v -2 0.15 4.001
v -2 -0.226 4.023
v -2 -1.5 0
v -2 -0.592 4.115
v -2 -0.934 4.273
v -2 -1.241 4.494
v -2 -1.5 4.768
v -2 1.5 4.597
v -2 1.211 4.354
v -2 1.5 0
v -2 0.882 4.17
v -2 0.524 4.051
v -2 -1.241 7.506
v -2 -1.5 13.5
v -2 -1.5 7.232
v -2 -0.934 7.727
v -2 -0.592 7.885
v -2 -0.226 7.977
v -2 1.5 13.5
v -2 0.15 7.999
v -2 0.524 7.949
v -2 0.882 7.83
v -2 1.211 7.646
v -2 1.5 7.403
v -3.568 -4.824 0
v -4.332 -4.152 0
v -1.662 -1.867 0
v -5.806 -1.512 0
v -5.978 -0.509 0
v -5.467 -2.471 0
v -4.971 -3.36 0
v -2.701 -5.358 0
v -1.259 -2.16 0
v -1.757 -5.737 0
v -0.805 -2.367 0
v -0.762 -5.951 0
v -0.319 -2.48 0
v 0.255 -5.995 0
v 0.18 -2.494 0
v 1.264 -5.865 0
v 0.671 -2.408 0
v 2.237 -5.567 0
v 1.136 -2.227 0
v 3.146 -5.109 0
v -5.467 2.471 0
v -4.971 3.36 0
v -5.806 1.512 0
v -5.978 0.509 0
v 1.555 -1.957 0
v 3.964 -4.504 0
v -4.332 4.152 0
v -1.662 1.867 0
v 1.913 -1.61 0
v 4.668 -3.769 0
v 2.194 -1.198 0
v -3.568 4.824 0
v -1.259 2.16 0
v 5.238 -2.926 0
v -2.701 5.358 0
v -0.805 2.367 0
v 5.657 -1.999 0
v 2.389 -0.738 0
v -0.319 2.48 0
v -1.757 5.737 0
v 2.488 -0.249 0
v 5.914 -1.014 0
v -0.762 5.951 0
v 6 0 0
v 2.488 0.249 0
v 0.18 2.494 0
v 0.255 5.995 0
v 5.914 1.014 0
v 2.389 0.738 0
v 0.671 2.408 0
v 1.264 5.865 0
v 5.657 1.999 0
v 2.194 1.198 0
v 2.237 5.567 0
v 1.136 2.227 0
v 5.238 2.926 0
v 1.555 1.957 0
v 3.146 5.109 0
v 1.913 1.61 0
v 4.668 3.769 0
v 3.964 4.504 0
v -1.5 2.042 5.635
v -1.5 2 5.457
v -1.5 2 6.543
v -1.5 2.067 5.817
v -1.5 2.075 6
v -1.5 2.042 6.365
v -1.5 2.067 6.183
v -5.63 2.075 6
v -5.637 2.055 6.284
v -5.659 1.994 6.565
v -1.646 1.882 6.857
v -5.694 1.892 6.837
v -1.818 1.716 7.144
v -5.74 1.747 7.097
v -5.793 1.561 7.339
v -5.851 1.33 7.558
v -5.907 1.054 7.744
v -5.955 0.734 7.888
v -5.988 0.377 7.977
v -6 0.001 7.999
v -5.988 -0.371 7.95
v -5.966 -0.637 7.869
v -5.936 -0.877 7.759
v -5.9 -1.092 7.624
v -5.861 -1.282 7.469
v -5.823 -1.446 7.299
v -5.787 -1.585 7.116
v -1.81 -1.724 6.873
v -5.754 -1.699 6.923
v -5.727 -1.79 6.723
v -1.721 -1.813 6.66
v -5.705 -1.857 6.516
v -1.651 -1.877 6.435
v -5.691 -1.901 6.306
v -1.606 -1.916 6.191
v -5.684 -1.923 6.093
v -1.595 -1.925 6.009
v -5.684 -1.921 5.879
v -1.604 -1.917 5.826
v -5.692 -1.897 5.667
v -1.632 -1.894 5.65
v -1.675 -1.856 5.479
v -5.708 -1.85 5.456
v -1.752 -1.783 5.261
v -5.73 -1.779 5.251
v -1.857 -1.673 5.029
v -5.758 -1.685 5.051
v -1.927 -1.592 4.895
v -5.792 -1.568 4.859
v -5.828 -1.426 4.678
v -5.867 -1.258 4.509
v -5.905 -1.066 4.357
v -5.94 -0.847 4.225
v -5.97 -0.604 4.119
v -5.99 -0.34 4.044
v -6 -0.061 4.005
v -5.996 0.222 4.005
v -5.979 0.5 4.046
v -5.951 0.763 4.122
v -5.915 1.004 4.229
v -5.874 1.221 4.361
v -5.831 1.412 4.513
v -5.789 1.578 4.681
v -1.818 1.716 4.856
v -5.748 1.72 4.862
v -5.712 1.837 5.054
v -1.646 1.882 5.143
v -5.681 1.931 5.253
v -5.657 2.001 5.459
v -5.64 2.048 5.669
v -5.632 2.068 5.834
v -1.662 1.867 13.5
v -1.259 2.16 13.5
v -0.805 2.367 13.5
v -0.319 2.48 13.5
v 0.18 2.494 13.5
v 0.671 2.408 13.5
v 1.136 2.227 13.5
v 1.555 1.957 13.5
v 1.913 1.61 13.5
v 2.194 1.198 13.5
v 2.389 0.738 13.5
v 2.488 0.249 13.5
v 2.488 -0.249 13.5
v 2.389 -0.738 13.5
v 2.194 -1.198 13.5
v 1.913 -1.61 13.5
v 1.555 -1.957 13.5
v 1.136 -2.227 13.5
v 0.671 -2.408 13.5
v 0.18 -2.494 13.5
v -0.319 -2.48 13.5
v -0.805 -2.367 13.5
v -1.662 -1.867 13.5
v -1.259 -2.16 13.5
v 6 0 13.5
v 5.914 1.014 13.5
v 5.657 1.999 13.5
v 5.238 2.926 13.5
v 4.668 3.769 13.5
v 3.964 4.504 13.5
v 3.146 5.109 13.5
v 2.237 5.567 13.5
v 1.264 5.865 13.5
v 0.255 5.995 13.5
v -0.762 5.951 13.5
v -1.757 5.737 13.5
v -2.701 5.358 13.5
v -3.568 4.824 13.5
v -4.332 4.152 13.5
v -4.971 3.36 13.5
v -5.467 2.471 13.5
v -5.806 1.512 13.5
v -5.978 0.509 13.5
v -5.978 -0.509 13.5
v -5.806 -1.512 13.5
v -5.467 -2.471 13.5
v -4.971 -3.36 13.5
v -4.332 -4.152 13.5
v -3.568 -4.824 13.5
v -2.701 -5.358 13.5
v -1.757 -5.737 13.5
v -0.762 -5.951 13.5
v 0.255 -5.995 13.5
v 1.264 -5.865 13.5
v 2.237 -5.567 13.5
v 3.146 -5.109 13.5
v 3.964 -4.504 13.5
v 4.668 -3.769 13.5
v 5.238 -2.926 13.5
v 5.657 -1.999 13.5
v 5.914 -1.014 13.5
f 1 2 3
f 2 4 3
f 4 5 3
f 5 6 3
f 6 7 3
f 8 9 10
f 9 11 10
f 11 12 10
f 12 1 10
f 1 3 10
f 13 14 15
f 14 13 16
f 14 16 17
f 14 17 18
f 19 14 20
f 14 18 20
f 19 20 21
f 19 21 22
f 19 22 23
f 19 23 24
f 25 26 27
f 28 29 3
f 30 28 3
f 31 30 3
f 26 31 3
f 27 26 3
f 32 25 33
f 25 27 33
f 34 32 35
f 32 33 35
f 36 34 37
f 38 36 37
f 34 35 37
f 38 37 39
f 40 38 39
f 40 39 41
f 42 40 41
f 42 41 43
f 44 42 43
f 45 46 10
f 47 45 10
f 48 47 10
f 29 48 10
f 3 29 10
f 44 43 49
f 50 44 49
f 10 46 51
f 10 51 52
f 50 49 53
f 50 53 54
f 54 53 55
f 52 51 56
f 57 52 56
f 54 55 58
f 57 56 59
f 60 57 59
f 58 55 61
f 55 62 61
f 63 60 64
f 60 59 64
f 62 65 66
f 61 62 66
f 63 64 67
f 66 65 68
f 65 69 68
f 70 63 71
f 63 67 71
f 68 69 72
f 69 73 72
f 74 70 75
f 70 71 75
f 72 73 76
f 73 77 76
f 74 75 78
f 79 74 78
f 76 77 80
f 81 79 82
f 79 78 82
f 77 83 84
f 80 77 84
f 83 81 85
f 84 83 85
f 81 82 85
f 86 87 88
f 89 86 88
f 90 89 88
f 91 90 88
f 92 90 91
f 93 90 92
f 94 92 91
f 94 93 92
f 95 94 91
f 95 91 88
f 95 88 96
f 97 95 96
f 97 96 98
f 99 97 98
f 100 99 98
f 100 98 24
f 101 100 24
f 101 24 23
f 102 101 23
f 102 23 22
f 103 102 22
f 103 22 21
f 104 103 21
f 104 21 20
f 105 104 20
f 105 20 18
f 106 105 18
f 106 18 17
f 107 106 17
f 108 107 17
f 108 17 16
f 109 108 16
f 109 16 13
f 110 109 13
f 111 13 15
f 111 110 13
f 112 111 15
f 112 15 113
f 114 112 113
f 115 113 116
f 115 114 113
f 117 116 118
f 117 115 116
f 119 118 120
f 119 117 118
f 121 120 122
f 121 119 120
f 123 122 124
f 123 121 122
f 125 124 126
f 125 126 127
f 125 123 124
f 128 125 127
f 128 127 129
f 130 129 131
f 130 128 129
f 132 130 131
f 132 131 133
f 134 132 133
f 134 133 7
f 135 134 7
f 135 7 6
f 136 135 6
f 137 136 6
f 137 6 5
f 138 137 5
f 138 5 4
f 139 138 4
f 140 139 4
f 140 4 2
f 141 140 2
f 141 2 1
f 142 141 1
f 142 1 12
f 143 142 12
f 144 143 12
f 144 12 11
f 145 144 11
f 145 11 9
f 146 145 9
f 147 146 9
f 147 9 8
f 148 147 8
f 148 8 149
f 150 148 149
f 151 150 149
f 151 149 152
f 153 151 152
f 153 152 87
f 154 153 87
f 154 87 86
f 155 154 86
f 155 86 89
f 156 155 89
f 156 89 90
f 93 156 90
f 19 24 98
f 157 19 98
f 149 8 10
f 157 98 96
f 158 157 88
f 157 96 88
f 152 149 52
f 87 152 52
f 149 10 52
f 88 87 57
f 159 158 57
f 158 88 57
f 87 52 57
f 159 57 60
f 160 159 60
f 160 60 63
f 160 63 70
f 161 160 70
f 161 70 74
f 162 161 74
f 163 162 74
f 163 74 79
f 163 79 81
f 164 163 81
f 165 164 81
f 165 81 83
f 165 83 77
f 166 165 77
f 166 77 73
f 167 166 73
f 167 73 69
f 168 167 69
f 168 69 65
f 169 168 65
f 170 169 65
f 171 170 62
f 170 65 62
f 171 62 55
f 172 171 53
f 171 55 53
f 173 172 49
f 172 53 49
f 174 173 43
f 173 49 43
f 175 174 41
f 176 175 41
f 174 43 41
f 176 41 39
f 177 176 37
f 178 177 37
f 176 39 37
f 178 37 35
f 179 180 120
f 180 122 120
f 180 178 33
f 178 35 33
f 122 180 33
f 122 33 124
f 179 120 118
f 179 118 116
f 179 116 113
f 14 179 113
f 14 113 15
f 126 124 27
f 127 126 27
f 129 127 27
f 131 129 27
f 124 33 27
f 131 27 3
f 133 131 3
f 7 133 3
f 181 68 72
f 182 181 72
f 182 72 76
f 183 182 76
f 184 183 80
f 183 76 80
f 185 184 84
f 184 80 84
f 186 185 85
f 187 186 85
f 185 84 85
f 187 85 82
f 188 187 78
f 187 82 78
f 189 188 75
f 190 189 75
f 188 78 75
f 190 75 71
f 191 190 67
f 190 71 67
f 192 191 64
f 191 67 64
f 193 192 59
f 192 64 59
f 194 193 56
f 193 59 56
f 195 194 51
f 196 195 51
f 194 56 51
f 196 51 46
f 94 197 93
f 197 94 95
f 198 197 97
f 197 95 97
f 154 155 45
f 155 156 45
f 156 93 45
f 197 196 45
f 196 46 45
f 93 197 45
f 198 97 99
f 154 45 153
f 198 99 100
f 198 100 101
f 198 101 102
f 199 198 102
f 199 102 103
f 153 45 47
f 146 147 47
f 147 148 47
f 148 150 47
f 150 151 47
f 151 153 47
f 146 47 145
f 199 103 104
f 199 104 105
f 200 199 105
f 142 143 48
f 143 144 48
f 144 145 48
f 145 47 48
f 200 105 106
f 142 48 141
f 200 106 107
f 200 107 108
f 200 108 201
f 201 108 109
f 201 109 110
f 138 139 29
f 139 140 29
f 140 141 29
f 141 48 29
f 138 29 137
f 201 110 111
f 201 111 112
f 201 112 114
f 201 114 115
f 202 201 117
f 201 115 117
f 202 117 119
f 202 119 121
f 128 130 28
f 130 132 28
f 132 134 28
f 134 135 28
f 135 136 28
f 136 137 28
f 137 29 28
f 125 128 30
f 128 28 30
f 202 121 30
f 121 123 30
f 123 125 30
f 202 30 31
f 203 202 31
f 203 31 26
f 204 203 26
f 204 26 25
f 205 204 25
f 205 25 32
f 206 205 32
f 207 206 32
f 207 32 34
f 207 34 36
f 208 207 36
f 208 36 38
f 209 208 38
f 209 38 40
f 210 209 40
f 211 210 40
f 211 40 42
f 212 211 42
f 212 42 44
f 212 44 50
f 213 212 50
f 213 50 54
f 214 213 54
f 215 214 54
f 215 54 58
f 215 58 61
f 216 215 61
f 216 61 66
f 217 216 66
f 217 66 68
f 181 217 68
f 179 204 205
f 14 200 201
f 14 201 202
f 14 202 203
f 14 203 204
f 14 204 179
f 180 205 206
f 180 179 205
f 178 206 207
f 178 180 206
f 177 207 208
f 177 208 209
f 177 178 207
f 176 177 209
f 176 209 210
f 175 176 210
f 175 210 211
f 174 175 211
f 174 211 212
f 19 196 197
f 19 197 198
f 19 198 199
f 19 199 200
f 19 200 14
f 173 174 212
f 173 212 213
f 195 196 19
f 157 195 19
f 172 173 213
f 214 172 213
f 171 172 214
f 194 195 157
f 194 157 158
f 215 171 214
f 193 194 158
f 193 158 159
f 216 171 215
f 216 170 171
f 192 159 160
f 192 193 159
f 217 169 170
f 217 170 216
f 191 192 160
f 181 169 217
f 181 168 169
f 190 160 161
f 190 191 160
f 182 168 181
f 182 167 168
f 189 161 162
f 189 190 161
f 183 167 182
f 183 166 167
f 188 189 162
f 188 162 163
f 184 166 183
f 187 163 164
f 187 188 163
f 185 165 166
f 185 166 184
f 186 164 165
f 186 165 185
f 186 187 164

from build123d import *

# Parameters (mm, degrees)
F0_R     = 6
F1_DEPTH = 13.5
F3_R     = 2
F4_DEPTH = 5


with BuildPart() as f1:
    # F0 (on Top) → F1 (new body)
    with BuildSketch(Plane.XY):
        Circle(F0_R)
        with BuildLine():
            ThreePointArc((-2, 1.5), (2.5, 0), (-2, -1.5))
            Line((-2, -1.5), (-2, 1.5))
        make_face(mode=Mode.SUBTRACT)
    extrude(amount=F1_DEPTH)

    # F3 (on offset) → F4 (cut)
    with BuildSketch(Plane.YZ.offset(-6.5)):
        with Locations((0.0751335174, 6)):
            Circle(F3_R)
    extrude(amount=F4_DEPTH, mode=Mode.SUBTRACT)


solid = f1.part
